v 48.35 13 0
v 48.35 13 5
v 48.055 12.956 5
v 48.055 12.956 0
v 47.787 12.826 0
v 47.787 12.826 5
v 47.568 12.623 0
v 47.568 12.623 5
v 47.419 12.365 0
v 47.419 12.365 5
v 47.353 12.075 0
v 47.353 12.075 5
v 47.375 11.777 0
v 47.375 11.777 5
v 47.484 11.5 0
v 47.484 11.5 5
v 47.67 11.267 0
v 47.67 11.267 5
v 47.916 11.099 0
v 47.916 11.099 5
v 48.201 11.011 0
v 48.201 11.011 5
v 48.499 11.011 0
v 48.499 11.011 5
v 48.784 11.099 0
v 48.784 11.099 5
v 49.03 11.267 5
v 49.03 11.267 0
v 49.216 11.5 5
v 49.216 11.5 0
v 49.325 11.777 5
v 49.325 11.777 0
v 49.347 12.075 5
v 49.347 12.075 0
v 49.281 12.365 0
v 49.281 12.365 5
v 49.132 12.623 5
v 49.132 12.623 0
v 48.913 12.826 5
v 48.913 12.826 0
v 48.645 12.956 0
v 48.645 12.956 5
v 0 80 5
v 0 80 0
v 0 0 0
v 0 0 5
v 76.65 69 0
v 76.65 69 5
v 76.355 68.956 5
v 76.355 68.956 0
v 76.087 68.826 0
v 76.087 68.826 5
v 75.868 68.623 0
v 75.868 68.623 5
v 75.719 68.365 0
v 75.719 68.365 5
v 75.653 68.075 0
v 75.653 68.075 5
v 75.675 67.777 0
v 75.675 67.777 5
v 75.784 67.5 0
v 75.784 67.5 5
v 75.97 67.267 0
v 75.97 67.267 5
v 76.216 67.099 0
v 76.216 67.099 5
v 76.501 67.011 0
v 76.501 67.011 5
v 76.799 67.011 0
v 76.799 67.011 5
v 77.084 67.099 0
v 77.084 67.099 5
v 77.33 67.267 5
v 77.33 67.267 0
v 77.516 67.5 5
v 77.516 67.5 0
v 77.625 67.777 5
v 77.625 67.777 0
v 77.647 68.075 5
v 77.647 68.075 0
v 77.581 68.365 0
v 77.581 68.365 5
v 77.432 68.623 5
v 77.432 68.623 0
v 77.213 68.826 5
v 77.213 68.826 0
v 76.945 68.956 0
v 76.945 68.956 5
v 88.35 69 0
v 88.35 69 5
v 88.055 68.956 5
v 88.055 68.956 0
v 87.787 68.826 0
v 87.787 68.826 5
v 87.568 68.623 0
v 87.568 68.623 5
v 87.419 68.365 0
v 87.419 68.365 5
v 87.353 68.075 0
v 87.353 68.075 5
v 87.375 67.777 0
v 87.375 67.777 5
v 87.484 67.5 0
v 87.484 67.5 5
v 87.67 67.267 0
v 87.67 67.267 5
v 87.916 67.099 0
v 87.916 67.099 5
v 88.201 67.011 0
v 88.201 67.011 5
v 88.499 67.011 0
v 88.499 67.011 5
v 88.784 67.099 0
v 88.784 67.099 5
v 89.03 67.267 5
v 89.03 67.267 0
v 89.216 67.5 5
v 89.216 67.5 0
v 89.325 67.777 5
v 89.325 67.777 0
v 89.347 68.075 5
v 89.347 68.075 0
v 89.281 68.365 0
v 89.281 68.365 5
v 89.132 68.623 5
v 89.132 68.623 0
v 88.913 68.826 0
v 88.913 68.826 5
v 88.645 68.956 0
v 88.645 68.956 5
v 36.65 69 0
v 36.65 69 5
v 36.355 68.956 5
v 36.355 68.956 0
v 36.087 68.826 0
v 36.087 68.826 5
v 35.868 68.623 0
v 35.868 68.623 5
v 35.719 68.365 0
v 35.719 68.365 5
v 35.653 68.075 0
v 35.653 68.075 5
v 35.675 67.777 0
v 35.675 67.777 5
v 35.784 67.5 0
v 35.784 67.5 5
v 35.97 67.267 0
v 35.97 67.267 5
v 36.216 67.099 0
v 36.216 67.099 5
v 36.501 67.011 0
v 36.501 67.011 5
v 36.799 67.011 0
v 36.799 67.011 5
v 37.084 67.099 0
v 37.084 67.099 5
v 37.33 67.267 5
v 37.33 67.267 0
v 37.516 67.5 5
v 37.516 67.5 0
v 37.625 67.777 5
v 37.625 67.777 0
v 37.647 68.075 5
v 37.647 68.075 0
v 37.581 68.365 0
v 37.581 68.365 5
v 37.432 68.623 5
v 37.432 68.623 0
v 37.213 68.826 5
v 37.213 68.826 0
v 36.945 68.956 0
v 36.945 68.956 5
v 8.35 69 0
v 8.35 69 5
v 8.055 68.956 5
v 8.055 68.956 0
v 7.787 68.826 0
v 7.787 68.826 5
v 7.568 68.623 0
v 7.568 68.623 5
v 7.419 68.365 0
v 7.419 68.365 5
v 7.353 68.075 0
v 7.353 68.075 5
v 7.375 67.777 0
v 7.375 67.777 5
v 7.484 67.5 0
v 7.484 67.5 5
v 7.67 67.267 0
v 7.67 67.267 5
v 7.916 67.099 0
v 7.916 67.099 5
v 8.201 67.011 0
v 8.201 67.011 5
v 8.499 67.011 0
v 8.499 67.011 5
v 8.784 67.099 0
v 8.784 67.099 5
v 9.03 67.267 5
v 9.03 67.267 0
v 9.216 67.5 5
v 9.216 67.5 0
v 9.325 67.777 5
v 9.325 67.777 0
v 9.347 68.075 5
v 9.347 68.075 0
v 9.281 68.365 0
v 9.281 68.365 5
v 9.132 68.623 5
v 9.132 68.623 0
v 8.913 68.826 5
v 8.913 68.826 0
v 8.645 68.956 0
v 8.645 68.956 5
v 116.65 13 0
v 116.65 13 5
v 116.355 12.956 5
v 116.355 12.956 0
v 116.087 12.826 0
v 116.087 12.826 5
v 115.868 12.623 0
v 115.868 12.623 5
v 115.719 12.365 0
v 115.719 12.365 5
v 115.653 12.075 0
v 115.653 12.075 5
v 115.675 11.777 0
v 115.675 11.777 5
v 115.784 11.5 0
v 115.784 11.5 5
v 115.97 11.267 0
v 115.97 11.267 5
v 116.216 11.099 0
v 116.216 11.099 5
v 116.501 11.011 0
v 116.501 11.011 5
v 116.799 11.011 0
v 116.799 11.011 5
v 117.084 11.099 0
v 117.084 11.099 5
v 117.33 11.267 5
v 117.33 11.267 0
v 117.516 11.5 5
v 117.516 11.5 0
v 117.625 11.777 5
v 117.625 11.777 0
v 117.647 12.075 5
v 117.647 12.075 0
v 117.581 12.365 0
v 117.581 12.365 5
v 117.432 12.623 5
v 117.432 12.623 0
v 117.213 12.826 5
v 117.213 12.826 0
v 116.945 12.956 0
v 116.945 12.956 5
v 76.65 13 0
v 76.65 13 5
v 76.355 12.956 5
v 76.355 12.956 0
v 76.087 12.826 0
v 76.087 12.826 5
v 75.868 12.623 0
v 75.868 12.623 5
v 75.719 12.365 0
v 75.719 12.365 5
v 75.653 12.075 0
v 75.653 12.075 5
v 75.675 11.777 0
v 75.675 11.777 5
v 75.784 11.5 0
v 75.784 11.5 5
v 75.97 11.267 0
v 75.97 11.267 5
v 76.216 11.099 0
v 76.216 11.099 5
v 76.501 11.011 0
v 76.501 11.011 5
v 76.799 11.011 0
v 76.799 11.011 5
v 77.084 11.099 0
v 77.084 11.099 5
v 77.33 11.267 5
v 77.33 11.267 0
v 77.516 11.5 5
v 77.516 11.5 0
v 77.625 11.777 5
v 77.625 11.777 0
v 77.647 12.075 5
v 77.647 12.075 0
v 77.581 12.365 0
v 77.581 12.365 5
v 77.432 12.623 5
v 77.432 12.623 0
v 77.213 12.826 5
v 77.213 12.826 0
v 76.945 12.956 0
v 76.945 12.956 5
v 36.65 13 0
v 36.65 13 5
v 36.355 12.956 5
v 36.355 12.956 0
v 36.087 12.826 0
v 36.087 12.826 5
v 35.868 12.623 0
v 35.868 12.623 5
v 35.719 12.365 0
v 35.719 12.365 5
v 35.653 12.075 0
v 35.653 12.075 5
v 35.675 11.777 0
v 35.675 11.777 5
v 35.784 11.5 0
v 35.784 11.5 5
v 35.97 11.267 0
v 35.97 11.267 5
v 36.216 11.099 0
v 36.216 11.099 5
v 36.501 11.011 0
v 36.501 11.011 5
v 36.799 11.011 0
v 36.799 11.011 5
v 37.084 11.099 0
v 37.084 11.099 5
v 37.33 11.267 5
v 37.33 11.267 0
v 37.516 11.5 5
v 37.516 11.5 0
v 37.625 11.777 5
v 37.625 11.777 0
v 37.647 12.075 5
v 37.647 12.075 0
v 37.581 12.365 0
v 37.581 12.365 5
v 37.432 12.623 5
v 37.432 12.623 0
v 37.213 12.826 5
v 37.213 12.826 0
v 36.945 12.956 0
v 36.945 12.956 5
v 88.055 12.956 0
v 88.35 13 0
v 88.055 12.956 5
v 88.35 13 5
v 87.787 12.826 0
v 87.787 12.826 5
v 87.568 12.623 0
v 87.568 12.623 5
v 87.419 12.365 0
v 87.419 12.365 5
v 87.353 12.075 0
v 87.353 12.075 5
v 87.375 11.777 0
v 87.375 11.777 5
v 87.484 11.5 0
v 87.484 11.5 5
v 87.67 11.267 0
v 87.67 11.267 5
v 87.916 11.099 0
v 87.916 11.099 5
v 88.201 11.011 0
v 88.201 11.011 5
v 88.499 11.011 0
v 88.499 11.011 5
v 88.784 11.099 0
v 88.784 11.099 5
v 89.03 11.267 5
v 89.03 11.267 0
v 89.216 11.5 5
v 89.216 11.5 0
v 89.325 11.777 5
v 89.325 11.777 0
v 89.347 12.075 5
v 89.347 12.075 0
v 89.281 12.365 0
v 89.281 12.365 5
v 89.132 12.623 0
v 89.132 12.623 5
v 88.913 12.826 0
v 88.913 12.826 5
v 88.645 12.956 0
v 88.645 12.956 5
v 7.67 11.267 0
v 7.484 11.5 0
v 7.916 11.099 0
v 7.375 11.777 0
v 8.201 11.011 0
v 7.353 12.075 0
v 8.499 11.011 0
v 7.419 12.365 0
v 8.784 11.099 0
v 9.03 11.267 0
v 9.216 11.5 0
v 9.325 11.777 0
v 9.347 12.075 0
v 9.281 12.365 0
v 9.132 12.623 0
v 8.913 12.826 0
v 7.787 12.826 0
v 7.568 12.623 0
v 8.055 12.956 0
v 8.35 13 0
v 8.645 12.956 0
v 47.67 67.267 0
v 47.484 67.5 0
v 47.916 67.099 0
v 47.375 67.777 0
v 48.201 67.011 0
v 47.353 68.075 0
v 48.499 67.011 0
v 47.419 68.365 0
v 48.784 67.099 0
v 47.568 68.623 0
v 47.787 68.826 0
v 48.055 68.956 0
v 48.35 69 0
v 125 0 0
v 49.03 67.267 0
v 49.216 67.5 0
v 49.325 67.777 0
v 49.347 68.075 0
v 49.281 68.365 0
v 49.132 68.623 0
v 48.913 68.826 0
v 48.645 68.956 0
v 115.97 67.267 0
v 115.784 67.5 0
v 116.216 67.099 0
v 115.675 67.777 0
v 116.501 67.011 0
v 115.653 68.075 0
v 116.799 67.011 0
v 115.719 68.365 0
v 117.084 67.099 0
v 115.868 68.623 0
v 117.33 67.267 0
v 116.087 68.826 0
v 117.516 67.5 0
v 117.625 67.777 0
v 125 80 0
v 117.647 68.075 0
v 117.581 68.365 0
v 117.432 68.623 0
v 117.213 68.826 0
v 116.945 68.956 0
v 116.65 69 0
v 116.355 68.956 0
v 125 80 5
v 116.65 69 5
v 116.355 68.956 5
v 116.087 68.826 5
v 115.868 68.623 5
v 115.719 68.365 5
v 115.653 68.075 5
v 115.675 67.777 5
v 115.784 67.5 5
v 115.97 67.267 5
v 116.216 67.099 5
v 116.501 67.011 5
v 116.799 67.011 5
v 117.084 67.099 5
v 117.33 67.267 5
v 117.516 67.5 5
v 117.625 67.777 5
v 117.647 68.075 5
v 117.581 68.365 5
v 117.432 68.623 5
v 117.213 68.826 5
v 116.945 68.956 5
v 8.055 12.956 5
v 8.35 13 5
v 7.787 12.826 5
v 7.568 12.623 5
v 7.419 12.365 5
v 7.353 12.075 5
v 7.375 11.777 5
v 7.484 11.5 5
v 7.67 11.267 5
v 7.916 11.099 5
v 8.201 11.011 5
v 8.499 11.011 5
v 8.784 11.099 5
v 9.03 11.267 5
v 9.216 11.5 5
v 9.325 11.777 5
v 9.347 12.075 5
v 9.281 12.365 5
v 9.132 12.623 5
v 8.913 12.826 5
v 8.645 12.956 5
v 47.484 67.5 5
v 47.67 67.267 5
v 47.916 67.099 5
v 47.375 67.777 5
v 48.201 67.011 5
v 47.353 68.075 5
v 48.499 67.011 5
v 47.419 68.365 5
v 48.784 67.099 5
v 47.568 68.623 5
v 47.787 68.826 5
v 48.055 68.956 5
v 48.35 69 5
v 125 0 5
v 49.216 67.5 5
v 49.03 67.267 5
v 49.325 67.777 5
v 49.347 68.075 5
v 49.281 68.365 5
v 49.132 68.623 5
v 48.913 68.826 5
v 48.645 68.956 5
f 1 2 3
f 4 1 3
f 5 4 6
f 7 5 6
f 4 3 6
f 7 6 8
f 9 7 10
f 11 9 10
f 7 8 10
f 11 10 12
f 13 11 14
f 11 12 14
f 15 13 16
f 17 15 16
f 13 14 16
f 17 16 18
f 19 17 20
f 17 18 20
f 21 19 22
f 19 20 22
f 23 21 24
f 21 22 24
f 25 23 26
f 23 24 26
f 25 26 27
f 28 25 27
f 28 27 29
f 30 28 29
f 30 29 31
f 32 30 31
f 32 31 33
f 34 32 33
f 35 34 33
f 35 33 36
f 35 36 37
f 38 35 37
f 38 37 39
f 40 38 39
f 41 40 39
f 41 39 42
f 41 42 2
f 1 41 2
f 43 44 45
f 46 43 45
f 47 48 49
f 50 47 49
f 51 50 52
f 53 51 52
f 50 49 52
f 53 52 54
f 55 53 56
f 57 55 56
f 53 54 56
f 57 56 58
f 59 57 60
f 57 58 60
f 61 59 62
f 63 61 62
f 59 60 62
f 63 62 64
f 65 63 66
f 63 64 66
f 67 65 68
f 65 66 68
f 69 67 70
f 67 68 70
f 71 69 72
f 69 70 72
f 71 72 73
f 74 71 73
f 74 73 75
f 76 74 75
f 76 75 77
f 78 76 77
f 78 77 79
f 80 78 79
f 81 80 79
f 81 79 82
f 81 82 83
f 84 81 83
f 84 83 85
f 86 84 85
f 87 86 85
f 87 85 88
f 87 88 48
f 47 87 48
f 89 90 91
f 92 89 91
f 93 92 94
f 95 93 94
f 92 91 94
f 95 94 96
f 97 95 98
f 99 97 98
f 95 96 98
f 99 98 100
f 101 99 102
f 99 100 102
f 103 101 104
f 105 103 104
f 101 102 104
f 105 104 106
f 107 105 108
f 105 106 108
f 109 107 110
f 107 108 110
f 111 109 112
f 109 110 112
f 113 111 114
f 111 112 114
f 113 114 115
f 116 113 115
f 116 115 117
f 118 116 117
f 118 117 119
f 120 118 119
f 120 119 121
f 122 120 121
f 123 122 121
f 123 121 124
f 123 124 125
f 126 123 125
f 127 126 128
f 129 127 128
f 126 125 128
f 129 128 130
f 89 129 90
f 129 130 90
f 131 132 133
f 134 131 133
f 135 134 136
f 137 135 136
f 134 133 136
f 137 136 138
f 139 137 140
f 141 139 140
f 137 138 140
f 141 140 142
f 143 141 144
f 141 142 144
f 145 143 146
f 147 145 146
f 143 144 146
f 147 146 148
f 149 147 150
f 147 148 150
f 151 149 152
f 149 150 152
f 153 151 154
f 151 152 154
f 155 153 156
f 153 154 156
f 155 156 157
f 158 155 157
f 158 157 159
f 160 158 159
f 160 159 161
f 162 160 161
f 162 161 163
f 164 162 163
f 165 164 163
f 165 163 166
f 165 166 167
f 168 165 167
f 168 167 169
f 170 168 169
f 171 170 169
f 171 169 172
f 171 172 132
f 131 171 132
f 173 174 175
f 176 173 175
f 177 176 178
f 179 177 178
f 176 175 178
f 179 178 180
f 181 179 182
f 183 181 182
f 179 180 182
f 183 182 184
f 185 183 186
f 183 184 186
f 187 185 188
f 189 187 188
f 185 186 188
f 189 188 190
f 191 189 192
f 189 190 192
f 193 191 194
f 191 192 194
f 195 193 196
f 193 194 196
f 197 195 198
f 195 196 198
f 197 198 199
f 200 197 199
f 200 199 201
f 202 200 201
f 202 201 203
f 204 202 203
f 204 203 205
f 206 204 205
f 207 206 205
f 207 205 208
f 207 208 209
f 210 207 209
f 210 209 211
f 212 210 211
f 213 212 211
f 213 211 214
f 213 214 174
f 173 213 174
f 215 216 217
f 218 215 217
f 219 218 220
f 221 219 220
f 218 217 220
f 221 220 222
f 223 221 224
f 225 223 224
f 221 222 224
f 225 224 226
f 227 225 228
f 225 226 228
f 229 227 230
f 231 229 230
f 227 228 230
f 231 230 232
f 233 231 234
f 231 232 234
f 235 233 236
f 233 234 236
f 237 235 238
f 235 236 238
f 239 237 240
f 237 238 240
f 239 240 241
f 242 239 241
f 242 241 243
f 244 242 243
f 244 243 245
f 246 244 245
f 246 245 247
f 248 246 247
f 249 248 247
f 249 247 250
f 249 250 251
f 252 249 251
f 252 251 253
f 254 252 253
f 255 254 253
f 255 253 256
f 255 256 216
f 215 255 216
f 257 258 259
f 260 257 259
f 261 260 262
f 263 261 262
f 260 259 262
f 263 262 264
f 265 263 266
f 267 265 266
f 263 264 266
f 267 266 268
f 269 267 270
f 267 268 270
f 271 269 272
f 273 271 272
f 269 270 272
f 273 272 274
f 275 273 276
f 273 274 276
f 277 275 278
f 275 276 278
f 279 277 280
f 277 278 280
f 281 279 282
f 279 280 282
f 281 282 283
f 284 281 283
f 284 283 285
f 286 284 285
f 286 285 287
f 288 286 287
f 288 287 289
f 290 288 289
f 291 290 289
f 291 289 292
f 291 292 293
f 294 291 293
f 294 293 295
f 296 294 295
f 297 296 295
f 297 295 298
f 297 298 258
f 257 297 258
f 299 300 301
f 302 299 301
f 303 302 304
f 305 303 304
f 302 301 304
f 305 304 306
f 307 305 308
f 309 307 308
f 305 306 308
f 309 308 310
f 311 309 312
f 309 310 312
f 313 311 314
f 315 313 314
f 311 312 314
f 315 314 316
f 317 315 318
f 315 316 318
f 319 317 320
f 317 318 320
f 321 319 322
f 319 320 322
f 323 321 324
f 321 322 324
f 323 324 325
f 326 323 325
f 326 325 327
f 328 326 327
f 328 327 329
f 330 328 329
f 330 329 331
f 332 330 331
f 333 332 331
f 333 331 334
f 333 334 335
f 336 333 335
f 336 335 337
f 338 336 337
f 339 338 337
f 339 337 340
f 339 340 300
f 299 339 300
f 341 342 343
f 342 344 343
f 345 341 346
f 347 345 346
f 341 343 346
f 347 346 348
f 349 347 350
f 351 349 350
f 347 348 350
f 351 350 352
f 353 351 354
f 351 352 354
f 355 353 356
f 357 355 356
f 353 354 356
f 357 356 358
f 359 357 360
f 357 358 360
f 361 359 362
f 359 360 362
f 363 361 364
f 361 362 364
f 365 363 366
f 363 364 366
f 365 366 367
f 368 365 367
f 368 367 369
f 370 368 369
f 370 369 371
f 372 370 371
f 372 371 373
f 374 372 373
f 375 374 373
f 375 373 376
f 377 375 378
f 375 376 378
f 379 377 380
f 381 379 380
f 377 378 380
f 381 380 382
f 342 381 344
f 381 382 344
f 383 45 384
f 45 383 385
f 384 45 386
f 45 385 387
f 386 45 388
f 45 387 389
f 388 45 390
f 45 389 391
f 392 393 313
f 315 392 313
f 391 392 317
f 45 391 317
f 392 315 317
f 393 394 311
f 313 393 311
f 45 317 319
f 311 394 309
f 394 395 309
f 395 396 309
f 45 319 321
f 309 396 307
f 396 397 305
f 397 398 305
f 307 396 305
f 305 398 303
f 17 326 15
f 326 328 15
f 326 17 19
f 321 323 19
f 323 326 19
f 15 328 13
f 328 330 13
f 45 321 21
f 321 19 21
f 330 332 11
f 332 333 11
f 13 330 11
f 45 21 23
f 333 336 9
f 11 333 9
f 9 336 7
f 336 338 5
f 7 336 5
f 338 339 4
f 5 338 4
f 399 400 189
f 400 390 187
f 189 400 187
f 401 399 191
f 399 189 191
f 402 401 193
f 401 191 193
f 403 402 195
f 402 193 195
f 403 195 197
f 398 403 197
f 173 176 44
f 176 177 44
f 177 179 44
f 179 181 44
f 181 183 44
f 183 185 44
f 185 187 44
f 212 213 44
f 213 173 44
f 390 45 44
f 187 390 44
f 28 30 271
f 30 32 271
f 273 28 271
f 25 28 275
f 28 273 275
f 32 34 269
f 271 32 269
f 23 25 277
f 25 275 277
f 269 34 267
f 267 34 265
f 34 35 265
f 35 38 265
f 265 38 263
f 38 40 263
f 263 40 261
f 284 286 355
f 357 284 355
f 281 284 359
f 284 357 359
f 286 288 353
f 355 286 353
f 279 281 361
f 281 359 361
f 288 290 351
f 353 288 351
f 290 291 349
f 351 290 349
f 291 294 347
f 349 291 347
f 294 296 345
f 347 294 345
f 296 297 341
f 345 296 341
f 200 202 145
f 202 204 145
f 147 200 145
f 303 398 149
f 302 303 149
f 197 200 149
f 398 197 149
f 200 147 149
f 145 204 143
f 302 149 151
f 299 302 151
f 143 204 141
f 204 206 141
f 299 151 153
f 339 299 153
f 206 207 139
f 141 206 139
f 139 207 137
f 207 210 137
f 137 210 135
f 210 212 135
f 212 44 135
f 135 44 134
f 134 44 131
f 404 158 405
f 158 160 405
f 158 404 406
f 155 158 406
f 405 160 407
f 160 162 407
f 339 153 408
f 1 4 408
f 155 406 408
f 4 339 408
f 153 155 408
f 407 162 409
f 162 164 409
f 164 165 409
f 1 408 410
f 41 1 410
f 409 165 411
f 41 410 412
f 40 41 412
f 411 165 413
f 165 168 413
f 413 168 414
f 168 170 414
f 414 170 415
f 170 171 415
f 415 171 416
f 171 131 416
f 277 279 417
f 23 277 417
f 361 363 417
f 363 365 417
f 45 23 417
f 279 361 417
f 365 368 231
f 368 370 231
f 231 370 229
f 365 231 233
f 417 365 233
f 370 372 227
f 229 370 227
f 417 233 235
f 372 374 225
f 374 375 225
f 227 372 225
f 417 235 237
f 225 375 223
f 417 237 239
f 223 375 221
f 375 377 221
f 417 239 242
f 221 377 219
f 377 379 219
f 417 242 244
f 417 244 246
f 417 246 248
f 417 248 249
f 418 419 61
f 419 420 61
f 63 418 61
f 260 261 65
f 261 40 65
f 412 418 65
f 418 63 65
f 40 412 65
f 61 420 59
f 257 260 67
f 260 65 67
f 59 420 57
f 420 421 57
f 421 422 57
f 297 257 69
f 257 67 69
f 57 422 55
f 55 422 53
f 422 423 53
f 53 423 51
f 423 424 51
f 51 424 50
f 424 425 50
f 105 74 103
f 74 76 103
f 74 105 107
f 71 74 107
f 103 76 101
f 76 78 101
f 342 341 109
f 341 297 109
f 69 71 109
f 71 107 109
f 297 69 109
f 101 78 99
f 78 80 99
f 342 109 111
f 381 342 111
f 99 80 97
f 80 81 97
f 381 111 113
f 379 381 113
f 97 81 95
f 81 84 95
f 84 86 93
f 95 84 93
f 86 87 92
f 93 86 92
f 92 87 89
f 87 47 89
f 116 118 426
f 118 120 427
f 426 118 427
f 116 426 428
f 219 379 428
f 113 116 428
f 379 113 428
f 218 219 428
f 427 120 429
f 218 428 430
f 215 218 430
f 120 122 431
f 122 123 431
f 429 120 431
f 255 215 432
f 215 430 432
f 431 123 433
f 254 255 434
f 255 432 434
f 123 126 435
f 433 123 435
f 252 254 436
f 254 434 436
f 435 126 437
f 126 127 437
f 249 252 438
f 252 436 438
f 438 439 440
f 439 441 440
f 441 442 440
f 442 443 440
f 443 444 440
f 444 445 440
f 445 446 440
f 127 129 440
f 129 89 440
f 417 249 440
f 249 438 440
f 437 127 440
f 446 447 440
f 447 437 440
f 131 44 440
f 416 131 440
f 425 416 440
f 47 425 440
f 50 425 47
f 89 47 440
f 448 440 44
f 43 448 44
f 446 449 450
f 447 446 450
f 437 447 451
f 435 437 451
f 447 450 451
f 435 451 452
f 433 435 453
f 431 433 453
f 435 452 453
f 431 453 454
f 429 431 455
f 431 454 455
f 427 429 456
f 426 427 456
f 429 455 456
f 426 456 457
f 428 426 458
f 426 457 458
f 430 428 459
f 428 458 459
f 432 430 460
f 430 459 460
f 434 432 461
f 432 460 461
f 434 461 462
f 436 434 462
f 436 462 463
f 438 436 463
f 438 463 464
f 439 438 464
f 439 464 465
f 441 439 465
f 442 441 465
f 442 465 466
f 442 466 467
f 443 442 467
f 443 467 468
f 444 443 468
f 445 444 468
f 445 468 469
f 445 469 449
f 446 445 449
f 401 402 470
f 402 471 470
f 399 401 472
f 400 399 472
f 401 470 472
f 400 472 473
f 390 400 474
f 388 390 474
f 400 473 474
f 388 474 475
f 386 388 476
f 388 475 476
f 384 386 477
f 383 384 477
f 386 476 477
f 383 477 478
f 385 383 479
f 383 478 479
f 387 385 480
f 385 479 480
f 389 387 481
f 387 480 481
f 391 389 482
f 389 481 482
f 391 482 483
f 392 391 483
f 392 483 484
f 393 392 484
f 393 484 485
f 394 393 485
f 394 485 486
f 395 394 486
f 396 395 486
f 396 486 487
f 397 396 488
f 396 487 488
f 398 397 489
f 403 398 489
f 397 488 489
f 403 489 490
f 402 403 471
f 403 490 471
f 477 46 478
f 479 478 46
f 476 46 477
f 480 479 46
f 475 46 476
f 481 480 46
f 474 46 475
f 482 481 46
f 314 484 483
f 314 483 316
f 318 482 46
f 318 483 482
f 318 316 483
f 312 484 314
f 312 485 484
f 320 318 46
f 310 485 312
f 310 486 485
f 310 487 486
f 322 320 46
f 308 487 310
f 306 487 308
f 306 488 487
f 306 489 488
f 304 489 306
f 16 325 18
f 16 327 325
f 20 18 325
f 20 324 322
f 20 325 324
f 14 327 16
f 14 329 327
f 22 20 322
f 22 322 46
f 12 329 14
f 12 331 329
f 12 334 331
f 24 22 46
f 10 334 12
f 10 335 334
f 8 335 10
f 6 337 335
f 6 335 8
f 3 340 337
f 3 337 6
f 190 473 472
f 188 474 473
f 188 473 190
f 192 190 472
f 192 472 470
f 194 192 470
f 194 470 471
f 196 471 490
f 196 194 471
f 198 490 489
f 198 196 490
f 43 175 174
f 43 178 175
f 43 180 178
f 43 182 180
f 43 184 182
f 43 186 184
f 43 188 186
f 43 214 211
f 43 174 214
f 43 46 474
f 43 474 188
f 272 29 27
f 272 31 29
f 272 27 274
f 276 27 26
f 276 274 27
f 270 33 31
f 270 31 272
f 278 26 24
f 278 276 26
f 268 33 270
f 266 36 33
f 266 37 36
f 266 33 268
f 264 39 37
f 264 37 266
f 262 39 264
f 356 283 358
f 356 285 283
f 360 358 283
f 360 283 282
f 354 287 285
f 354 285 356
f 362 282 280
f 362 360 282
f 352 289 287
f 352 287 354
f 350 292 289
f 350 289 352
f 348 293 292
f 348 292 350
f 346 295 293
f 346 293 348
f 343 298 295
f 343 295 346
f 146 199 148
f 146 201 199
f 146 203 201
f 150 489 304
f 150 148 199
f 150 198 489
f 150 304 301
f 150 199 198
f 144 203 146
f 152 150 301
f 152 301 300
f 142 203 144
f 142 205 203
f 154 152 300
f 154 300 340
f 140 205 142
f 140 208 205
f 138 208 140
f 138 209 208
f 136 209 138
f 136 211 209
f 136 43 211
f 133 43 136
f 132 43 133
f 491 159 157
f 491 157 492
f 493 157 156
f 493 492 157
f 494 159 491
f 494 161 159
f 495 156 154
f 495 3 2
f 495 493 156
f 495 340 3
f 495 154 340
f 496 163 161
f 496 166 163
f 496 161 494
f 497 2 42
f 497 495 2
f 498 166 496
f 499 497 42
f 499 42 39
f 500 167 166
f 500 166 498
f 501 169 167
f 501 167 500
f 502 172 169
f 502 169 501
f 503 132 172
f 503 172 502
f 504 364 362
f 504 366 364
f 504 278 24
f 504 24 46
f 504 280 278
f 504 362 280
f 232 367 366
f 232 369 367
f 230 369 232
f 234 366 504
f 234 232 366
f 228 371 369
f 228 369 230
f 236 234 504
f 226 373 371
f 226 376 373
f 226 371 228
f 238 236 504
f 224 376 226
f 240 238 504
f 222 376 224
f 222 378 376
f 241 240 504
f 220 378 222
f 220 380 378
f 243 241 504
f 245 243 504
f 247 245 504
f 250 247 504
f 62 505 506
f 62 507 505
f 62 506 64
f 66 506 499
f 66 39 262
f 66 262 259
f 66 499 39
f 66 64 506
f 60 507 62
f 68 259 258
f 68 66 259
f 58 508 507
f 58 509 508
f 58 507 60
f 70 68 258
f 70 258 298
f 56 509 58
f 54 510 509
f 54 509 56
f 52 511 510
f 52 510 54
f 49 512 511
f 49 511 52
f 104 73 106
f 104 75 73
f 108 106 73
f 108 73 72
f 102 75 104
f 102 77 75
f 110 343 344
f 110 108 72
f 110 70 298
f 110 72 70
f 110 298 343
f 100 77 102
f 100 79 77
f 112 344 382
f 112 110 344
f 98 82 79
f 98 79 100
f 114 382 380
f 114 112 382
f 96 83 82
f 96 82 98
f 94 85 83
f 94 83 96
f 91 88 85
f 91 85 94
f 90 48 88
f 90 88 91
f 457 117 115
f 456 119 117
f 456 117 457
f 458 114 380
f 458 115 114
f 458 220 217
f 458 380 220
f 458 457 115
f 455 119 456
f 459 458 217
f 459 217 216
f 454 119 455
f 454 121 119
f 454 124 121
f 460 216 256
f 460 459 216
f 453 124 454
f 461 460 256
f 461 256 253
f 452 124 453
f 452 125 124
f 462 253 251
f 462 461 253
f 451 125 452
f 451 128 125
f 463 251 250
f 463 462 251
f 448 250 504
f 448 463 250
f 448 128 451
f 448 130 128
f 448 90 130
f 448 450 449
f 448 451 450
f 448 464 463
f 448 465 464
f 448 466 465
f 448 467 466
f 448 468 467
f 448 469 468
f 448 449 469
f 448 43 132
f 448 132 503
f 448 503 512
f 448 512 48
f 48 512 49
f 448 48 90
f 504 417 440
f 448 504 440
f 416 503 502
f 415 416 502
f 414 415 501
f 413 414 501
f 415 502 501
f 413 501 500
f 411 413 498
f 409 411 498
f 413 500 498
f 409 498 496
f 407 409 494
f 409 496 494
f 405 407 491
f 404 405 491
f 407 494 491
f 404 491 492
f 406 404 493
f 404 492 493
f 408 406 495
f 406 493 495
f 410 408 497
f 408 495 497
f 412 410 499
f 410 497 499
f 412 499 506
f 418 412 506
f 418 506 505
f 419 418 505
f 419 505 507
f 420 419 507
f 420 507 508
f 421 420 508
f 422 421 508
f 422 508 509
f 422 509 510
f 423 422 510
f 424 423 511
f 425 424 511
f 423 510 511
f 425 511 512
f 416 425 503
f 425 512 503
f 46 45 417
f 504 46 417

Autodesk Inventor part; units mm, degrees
ref_plane "YZ Plane" through (0, 0, 0) normal (1, 0, 0) x (0, 1, 0)
ref_plane "XZ Plane" through (0, 0, 0) normal (0, 1, 0) x (-1, 0, 0)
ref_plane "XY Plane" through (0, 0, 0) normal (0, 0, 1) x (1, 0, 0)
sketch "Skizze1" plane through (0, 0, 0) normal (0, 0, 1) x (1, 0, 0)
  line L0 (0, 0) -> (125, 0)
  line L1 (125, 0) -> (125, 80)
  line L2 (125, 80) -> (0, 80)
  line L3 (0, 80) -> (0, 0)
  line L4 (6, 70.5) -> (39, 70.5) construction
  line L5 (39, 70.5) -> (39, 9.5) construction
  line L6 (39, 9.5) -> (6, 9.5) construction
  line L7 (6, 9.5) -> (6, 70.5) construction
  line L8 (46, 70.5) -> (79, 70.5) construction
  line L9 (79, 70.5) -> (79, 9.5) construction
  line L10 (79, 9.5) -> (46, 9.5) construction
  line L11 (46, 9.5) -> (46, 70.5) construction
  line L12 (86, 70.5) -> (119, 70.5) construction
  line L13 (119, 70.5) -> (119, 9.5) construction
  line L14 (119, 9.5) -> (86, 9.5) construction
  line L15 (86, 9.5) -> (86, 70.5) construction
  line L16 (6, 40) -> (119, 40) construction
  line L17 (62.5, 70.5) -> (62.5, 9.5) construction
  line L18 (22.5, 70.5) -> (22.5, 9.5) construction
  line L19 (102.5, 70.5) -> (102.5, 9.5) construction
  line L20 (8.35, 68) -> (36.65, 68) construction
  line L21 (8.35, 68) -> (8.35, 12) construction
  line L22 (8.35, 12) -> (36.65, 12) construction
  line L23 (36.65, 12) -> (36.65, 68) construction
  line L24 (62.5, 80) -> (62.5, 0) construction
  line L25 (48.35, 68) -> (76.65, 68) construction
  line L26 (48.35, 68) -> (48.35, 12) construction
  line L27 (48.35, 12) -> (76.65, 12) construction
  line L28 (76.65, 12) -> (76.65, 68) construction
  line L29 (48.35, 68) -> (76.65, 12) construction
  line L30 (48.35, 12) -> (76.65, 68) construction
  line L31 (116.65, 12) -> (116.65, 68) construction
  line L32 (88.35, 68) -> (116.65, 68) construction
  line L33 (88.35, 68) -> (88.35, 12) construction
  line L34 (88.35, 12) -> (116.65, 12) construction
  line L35 (88.35, 68) -> (116.65, 12) construction
  line L36 (88.35, 12) -> (116.65, 68) construction
  point P0 (62.5, 40)
  point P1 (22.5, 68)
  point P2 (8.35, 40)
  point P3 (0, 40)
  point P4 (62.5, 68)
  point P5 (48.35, 40)
  point P6 (62.5, 40)
  point P7 (102.5, 68)
  point P8 (88.35, 40)
  point P9 (102.5, 40)
  dimension "d0" = 80
  dimension "d1" = 125
  dimension "d2" = 40
  dimension "d3" = 33
  dimension "d4" = 61
  dimension "d5" = 28.3
  dimension "d6" = 56
  dimension "d7" = 28.3
  dimension "d8" = 56
  dimension "d9" = 28.3
  dimension "d10" = 56
extrude "Extrusion1" add sketch "Skizze1" along normal blind 5
hole "Bohrung1" at (8.35, 68, 0) at (36.65, 68, 0) at (8.35, 12, 0) at (36.65, 12, 0) at (76.65, 12, 0) at (76.65, 68, 0) at (48.35, 68, 0) at (48.35, 12, 0) at (116.65, 12, 0) at (116.65, 68, 0) at (88.35, 12, 0) at (88.35, 68, 0) direction (0, 0, 1) diameter 2 end through all
properties part number "MotorDriverFixation"
